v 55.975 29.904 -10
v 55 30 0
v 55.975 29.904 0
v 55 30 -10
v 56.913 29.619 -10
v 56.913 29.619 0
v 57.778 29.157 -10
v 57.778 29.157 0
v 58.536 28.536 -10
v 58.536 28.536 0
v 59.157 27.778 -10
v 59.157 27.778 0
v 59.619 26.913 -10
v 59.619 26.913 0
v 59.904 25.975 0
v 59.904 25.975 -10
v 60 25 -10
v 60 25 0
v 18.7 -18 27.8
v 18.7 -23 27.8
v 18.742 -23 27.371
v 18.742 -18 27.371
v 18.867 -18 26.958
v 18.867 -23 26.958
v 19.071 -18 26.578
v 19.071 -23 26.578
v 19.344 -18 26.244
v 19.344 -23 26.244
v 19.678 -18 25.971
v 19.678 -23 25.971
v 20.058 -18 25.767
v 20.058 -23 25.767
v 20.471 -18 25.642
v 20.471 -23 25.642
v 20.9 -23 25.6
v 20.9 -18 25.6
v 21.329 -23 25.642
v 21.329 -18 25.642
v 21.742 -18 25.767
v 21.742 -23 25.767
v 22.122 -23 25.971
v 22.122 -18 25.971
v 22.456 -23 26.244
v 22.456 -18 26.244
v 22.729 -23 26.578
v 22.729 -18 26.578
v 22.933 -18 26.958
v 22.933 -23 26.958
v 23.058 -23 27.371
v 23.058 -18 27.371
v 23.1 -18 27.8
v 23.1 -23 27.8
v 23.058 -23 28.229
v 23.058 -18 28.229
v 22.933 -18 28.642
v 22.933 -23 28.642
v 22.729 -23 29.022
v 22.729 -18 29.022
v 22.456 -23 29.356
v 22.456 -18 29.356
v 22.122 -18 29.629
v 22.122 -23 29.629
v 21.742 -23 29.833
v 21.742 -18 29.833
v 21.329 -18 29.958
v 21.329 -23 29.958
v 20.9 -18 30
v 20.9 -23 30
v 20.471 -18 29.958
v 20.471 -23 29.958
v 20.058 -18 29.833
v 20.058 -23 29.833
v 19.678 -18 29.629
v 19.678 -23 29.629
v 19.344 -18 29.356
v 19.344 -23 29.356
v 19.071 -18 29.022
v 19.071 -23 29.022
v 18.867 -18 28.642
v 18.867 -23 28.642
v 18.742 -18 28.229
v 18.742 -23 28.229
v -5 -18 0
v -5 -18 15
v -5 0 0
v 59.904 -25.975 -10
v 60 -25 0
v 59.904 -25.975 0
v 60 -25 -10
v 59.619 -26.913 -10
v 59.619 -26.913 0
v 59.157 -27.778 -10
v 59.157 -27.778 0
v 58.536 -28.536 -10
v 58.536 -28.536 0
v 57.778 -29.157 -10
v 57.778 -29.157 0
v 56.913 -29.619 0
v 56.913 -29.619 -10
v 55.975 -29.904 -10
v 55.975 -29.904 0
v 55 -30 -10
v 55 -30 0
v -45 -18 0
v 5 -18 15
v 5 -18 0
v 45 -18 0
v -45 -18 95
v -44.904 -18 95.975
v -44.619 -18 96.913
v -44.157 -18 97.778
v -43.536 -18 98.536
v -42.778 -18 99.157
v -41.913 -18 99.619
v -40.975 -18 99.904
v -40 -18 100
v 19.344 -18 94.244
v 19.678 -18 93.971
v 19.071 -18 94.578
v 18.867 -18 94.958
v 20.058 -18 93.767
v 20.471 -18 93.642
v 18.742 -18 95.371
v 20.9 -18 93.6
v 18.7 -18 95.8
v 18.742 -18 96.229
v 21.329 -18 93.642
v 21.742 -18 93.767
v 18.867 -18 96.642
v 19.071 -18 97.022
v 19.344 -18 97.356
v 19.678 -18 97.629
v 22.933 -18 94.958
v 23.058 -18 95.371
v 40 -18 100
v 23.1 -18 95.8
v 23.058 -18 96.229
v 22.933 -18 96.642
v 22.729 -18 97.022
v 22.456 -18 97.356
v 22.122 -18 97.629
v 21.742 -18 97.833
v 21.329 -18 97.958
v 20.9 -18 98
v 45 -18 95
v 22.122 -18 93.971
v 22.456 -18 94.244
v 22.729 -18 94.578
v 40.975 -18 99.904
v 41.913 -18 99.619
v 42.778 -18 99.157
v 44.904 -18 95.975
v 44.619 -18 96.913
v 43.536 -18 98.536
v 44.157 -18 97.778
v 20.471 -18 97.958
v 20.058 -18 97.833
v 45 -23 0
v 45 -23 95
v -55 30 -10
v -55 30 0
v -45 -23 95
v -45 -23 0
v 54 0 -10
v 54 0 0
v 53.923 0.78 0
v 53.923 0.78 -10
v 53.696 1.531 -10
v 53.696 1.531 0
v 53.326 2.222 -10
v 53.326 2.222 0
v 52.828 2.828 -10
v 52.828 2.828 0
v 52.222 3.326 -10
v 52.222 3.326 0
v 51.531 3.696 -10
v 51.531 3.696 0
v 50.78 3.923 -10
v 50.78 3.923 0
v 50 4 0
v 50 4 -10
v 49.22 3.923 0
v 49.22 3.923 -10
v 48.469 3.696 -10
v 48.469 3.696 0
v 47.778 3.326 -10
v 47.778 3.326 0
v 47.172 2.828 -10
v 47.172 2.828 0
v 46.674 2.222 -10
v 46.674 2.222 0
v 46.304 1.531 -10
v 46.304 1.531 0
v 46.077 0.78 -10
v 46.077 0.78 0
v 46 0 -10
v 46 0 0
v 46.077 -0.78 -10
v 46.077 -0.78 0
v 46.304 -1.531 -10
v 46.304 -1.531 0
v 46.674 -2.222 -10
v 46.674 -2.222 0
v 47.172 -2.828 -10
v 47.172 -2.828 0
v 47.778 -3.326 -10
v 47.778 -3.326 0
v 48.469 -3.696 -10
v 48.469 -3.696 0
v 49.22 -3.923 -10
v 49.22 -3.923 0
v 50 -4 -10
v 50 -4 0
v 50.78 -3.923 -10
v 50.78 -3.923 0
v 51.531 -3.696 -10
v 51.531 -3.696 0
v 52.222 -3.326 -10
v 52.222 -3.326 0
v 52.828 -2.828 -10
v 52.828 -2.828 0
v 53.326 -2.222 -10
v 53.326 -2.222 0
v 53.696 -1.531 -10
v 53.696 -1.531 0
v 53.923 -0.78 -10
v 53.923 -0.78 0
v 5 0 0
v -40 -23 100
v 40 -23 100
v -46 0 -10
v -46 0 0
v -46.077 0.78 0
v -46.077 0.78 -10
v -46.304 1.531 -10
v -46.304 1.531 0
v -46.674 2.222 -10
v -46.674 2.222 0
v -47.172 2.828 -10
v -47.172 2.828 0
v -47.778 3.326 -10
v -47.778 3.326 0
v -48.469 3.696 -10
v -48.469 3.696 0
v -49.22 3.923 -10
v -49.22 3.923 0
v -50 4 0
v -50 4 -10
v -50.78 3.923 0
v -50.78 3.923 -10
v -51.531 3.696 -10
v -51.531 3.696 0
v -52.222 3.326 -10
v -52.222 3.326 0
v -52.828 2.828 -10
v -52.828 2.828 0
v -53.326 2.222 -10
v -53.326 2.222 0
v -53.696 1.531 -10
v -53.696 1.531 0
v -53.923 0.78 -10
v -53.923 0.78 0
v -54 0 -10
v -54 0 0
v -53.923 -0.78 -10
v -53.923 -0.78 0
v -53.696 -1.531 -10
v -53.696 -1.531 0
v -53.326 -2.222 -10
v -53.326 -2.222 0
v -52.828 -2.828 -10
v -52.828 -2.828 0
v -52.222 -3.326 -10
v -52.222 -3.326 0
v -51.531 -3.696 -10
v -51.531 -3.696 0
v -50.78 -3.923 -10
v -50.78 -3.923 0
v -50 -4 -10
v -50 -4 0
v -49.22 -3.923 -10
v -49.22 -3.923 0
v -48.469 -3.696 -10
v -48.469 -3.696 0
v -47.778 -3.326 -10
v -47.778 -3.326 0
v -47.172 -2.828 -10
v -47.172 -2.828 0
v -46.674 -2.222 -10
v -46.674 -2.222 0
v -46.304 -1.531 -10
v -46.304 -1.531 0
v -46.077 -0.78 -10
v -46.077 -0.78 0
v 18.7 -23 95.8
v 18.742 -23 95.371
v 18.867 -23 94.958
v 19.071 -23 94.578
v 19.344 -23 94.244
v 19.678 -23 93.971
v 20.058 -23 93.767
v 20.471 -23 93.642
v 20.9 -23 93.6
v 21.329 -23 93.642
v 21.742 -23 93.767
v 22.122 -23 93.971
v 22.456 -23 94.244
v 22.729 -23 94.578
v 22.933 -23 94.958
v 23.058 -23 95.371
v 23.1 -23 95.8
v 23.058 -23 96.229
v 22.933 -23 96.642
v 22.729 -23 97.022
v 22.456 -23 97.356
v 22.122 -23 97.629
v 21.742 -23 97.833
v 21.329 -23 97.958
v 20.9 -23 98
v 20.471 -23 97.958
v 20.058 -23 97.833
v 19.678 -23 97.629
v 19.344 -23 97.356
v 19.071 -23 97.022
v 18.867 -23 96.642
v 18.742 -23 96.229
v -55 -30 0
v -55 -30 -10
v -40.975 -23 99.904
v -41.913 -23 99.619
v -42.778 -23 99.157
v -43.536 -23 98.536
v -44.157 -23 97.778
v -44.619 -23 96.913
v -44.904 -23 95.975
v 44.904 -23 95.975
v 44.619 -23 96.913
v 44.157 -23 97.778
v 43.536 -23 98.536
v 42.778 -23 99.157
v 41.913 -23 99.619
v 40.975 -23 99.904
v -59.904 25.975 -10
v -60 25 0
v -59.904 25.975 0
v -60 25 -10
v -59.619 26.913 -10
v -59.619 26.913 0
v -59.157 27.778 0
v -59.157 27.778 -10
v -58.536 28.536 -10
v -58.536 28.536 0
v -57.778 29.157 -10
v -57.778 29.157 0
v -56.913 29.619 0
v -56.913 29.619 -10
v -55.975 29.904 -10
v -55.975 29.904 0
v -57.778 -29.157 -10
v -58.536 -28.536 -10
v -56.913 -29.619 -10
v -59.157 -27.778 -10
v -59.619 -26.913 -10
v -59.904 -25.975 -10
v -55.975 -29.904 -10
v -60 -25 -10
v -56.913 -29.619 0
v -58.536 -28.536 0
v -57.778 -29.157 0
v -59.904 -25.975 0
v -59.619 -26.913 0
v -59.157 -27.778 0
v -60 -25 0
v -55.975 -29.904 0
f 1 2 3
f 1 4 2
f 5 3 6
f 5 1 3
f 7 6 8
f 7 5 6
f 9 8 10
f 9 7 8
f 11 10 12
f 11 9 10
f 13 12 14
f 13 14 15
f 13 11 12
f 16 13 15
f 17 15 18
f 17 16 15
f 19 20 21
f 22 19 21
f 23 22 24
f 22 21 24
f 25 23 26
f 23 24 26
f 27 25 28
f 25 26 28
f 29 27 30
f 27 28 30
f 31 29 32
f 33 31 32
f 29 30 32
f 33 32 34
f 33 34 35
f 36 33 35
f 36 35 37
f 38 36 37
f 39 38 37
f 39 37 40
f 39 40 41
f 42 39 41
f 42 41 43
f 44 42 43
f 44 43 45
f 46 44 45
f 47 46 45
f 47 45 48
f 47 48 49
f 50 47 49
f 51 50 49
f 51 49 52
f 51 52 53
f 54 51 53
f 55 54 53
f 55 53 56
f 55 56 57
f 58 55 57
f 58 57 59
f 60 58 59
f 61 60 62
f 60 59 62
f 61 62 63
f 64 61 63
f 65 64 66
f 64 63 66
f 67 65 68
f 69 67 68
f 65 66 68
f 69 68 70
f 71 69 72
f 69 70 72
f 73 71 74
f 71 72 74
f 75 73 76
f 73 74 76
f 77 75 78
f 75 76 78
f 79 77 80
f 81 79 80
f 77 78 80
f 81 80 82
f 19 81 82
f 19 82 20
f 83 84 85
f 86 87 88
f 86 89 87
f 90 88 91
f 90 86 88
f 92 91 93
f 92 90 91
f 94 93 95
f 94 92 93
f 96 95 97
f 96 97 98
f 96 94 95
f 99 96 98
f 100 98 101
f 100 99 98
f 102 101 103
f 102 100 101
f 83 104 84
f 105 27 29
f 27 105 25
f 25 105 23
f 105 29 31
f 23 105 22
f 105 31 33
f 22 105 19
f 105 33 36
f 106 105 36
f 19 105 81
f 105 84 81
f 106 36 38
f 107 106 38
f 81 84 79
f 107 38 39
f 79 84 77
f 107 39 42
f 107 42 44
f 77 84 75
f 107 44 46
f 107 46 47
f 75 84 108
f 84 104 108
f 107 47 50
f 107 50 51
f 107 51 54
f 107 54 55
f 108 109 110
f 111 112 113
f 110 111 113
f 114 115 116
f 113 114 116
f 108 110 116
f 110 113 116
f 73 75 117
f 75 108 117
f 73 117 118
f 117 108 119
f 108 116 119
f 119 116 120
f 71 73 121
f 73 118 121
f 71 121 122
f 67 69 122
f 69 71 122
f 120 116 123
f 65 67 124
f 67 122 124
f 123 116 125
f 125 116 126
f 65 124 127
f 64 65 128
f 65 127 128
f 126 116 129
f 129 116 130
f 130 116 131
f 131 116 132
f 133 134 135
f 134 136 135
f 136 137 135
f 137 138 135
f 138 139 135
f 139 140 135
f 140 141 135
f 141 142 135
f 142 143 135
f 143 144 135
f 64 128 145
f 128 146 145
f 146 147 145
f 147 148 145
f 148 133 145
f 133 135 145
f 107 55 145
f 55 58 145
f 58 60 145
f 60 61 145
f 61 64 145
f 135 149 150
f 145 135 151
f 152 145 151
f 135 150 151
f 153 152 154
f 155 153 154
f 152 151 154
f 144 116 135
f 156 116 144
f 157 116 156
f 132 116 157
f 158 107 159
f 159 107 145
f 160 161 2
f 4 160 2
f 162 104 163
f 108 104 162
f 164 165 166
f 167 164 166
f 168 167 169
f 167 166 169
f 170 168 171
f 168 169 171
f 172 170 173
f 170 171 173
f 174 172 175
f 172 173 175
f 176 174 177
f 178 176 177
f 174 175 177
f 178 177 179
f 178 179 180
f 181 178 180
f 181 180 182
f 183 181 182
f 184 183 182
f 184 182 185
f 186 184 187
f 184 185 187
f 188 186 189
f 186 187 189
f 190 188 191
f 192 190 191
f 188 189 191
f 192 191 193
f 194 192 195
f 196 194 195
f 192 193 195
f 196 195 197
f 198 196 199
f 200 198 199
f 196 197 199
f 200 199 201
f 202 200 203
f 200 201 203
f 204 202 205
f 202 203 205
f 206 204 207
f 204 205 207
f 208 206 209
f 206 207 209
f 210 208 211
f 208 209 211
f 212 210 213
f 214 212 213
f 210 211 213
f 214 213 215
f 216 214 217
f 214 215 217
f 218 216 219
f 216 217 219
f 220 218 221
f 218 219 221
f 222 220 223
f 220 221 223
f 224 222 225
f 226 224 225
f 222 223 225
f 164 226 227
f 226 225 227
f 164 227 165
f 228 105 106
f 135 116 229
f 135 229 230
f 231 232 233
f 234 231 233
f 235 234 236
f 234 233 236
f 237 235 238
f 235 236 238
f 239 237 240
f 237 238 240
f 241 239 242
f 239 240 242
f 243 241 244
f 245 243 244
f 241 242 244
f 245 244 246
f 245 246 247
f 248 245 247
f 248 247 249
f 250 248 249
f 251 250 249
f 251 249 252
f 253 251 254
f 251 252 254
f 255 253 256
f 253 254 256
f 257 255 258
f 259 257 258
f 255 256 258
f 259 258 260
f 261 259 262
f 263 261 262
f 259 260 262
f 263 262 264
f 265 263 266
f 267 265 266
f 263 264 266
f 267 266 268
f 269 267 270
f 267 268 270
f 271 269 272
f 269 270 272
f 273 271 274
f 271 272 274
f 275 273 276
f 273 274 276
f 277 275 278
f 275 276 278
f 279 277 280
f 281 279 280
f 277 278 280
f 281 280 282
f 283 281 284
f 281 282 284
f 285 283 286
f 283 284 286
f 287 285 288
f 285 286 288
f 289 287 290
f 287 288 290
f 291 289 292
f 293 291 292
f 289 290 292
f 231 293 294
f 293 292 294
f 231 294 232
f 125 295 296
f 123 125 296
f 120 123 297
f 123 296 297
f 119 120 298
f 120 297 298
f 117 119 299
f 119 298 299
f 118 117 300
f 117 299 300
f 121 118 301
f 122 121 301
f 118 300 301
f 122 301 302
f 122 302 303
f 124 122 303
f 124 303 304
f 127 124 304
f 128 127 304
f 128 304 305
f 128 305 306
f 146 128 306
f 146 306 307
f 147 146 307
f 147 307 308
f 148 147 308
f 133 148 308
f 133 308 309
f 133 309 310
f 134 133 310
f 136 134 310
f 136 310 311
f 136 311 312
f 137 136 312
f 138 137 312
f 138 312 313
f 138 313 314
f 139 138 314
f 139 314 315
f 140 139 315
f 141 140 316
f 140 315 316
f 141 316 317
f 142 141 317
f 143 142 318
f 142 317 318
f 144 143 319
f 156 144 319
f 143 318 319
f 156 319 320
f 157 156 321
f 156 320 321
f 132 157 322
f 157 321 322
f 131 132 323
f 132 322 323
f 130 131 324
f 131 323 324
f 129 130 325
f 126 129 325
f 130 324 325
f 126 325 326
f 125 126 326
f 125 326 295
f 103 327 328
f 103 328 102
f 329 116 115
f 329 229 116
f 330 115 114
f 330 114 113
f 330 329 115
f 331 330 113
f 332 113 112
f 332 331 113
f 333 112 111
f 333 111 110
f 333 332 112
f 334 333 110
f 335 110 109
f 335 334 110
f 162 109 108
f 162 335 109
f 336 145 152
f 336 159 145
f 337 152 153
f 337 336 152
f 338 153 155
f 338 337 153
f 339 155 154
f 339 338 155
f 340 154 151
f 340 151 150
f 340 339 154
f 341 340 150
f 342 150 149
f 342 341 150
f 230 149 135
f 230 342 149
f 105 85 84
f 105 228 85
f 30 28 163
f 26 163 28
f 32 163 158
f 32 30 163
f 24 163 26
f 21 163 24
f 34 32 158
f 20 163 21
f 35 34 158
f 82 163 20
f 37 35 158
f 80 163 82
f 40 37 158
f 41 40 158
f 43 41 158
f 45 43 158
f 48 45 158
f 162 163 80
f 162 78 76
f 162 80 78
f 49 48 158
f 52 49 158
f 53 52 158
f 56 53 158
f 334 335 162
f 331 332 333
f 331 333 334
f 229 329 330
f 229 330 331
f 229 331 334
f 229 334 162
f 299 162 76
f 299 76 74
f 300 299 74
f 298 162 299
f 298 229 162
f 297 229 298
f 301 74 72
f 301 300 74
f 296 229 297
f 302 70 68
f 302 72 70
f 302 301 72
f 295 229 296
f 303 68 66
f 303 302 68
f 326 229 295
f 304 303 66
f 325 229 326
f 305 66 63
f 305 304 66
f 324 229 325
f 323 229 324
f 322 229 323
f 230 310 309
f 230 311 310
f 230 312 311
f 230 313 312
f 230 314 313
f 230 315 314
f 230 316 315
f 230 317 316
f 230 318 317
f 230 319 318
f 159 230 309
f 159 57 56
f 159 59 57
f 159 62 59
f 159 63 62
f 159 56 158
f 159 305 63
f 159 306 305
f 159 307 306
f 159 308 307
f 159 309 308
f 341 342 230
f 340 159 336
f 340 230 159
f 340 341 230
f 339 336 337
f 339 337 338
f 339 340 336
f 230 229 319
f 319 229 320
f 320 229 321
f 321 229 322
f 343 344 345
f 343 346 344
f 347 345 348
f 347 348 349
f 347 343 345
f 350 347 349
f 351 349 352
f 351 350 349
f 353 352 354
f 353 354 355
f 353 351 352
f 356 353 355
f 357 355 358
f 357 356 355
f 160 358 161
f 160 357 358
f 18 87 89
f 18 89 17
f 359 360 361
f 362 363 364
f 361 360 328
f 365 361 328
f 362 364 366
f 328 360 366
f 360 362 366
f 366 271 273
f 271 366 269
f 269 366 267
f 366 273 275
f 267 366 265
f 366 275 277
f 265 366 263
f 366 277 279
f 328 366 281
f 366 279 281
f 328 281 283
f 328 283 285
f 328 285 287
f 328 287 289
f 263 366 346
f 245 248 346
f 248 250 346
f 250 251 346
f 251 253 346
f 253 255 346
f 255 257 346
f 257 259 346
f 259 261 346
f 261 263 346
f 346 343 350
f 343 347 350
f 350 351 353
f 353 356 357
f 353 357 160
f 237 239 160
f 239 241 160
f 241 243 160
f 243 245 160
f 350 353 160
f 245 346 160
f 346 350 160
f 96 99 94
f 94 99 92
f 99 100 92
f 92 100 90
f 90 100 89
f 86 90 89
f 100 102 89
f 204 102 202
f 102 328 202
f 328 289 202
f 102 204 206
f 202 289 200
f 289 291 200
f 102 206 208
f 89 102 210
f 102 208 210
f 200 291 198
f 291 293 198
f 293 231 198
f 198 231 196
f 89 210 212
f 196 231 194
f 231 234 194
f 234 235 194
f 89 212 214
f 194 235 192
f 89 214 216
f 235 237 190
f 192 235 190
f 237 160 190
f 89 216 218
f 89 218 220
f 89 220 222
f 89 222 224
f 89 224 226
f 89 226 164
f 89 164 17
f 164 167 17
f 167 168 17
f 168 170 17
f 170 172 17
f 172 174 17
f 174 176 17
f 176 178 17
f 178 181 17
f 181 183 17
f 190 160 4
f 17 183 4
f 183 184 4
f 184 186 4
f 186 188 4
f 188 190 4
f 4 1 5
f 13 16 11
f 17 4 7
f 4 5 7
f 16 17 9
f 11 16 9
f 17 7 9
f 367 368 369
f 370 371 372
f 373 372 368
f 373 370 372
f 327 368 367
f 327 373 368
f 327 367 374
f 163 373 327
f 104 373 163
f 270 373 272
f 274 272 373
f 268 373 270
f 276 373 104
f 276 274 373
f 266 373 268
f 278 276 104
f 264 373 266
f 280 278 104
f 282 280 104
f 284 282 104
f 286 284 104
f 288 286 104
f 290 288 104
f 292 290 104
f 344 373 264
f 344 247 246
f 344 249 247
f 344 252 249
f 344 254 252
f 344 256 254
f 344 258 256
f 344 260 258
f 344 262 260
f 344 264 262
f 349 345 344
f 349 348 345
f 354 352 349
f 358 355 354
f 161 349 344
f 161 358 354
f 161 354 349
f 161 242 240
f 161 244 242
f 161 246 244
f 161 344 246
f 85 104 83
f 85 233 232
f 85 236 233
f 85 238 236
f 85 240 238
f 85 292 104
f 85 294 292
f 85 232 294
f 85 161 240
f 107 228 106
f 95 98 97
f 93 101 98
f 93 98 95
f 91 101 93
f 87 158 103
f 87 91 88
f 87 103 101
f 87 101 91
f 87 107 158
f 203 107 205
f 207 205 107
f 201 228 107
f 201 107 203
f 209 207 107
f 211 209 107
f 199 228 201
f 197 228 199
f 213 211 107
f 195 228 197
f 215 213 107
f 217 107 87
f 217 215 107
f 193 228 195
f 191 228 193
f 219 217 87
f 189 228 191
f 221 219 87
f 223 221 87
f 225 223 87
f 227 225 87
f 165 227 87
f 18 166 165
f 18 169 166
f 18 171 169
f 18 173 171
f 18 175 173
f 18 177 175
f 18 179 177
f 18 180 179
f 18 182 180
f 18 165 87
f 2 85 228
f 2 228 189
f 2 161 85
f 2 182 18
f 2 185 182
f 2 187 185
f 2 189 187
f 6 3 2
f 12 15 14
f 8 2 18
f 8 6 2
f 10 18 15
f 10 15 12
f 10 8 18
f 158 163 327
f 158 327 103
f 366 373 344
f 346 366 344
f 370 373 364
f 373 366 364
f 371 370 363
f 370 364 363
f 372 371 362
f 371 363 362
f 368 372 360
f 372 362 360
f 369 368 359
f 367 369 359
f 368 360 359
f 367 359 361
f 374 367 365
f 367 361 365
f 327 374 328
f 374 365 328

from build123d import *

# Parameters (mm, degrees)
F0_W      = 120
F0_H      = 60
F0_R      = 4
F1_DEPTH  = 10
F3_W      = 90
F3_H      = 100
F4_DEPTH  = 5
F7_D      = 4.4
F8_D      = 4.4
F9_R      = 5
F10_R     = 5
F11_R     = 5
F12_R     = 5
F13_R     = 5
F14_R     = 5
F16_DEPTH = 5


# Not quite as in the source:
# - a feature of the source that left no trace in its solid (it failed there, or was rolled back) is left out


with BuildPart() as f1:
    # F0 (on Top) → F1 (new body)
    with BuildSketch(Plane.XY):
        Rectangle(F0_W, F0_H)
        with Locations((-50, 0)):
            Circle(F0_R, mode=Mode.SUBTRACT)
        with Locations((50, 0)):
            Circle(F0_R, mode=Mode.SUBTRACT)
    extrude(amount=-F1_DEPTH)

    # F3 (on offset) → F4 (join)
    with BuildSketch(Plane.XZ.offset(18)):
        with Locations((0, 50)):
            Rectangle(F3_W, F3_H)
    extrude(amount=F4_DEPTH)

    # F7 (through all)
    with Locations(Plane(origin=(0, -18, 0), x_dir=(1, 0, 0), z_dir=(0, 1, 0))):
        with Locations((20.9, -95.8)):
            Hole(F7_D / 2)

    # F8 (through all)
    with Locations(Plane(origin=(0, -18, 0), x_dir=(1, 0, 0), z_dir=(0, 1, 0))):
        with Locations((20.9, -27.8)):
            Hole(F8_D / 2)

    # F9
    f9_edges = [f1.edges().sort_by_distance(p)[0] for p in [
        (-60, -30, -5),
    ]]
    fillet(f9_edges, radius=F9_R)

    # F10
    f10_edges = [f1.edges().sort_by_distance(p)[0] for p in [
        (-60, 30, -5),
    ]]
    fillet(f10_edges, radius=F10_R)

    # F11
    f11_edges = [f1.edges().sort_by_distance(p)[0] for p in [
        (60, 30, -5),
    ]]
    fillet(f11_edges, radius=F11_R)

    # F12
    f12_edges = [f1.edges().sort_by_distance(p)[0] for p in [
        (60, -30, -5),
    ]]
    fillet(f12_edges, radius=F12_R)

    # F13
    f13_edges = [f1.edges().sort_by_distance(p)[0] for p in [
        (45, -20.5, 100),
    ]]
    fillet(f13_edges, radius=F13_R)

    # F14
    f14_edges = [f1.edges().sort_by_distance(p)[0] for p in [
        (-45, -20.5, 100),
    ]]
    fillet(f14_edges, radius=F14_R)

    # F15 (on Right) → F16 (join, symmetric)
    with BuildSketch(Plane.YZ):
        Polygon((0, 0), (-18, 15), (-18, 0), align=None)
    extrude(amount=F16_DEPTH, both=True)


solid = f1.part
